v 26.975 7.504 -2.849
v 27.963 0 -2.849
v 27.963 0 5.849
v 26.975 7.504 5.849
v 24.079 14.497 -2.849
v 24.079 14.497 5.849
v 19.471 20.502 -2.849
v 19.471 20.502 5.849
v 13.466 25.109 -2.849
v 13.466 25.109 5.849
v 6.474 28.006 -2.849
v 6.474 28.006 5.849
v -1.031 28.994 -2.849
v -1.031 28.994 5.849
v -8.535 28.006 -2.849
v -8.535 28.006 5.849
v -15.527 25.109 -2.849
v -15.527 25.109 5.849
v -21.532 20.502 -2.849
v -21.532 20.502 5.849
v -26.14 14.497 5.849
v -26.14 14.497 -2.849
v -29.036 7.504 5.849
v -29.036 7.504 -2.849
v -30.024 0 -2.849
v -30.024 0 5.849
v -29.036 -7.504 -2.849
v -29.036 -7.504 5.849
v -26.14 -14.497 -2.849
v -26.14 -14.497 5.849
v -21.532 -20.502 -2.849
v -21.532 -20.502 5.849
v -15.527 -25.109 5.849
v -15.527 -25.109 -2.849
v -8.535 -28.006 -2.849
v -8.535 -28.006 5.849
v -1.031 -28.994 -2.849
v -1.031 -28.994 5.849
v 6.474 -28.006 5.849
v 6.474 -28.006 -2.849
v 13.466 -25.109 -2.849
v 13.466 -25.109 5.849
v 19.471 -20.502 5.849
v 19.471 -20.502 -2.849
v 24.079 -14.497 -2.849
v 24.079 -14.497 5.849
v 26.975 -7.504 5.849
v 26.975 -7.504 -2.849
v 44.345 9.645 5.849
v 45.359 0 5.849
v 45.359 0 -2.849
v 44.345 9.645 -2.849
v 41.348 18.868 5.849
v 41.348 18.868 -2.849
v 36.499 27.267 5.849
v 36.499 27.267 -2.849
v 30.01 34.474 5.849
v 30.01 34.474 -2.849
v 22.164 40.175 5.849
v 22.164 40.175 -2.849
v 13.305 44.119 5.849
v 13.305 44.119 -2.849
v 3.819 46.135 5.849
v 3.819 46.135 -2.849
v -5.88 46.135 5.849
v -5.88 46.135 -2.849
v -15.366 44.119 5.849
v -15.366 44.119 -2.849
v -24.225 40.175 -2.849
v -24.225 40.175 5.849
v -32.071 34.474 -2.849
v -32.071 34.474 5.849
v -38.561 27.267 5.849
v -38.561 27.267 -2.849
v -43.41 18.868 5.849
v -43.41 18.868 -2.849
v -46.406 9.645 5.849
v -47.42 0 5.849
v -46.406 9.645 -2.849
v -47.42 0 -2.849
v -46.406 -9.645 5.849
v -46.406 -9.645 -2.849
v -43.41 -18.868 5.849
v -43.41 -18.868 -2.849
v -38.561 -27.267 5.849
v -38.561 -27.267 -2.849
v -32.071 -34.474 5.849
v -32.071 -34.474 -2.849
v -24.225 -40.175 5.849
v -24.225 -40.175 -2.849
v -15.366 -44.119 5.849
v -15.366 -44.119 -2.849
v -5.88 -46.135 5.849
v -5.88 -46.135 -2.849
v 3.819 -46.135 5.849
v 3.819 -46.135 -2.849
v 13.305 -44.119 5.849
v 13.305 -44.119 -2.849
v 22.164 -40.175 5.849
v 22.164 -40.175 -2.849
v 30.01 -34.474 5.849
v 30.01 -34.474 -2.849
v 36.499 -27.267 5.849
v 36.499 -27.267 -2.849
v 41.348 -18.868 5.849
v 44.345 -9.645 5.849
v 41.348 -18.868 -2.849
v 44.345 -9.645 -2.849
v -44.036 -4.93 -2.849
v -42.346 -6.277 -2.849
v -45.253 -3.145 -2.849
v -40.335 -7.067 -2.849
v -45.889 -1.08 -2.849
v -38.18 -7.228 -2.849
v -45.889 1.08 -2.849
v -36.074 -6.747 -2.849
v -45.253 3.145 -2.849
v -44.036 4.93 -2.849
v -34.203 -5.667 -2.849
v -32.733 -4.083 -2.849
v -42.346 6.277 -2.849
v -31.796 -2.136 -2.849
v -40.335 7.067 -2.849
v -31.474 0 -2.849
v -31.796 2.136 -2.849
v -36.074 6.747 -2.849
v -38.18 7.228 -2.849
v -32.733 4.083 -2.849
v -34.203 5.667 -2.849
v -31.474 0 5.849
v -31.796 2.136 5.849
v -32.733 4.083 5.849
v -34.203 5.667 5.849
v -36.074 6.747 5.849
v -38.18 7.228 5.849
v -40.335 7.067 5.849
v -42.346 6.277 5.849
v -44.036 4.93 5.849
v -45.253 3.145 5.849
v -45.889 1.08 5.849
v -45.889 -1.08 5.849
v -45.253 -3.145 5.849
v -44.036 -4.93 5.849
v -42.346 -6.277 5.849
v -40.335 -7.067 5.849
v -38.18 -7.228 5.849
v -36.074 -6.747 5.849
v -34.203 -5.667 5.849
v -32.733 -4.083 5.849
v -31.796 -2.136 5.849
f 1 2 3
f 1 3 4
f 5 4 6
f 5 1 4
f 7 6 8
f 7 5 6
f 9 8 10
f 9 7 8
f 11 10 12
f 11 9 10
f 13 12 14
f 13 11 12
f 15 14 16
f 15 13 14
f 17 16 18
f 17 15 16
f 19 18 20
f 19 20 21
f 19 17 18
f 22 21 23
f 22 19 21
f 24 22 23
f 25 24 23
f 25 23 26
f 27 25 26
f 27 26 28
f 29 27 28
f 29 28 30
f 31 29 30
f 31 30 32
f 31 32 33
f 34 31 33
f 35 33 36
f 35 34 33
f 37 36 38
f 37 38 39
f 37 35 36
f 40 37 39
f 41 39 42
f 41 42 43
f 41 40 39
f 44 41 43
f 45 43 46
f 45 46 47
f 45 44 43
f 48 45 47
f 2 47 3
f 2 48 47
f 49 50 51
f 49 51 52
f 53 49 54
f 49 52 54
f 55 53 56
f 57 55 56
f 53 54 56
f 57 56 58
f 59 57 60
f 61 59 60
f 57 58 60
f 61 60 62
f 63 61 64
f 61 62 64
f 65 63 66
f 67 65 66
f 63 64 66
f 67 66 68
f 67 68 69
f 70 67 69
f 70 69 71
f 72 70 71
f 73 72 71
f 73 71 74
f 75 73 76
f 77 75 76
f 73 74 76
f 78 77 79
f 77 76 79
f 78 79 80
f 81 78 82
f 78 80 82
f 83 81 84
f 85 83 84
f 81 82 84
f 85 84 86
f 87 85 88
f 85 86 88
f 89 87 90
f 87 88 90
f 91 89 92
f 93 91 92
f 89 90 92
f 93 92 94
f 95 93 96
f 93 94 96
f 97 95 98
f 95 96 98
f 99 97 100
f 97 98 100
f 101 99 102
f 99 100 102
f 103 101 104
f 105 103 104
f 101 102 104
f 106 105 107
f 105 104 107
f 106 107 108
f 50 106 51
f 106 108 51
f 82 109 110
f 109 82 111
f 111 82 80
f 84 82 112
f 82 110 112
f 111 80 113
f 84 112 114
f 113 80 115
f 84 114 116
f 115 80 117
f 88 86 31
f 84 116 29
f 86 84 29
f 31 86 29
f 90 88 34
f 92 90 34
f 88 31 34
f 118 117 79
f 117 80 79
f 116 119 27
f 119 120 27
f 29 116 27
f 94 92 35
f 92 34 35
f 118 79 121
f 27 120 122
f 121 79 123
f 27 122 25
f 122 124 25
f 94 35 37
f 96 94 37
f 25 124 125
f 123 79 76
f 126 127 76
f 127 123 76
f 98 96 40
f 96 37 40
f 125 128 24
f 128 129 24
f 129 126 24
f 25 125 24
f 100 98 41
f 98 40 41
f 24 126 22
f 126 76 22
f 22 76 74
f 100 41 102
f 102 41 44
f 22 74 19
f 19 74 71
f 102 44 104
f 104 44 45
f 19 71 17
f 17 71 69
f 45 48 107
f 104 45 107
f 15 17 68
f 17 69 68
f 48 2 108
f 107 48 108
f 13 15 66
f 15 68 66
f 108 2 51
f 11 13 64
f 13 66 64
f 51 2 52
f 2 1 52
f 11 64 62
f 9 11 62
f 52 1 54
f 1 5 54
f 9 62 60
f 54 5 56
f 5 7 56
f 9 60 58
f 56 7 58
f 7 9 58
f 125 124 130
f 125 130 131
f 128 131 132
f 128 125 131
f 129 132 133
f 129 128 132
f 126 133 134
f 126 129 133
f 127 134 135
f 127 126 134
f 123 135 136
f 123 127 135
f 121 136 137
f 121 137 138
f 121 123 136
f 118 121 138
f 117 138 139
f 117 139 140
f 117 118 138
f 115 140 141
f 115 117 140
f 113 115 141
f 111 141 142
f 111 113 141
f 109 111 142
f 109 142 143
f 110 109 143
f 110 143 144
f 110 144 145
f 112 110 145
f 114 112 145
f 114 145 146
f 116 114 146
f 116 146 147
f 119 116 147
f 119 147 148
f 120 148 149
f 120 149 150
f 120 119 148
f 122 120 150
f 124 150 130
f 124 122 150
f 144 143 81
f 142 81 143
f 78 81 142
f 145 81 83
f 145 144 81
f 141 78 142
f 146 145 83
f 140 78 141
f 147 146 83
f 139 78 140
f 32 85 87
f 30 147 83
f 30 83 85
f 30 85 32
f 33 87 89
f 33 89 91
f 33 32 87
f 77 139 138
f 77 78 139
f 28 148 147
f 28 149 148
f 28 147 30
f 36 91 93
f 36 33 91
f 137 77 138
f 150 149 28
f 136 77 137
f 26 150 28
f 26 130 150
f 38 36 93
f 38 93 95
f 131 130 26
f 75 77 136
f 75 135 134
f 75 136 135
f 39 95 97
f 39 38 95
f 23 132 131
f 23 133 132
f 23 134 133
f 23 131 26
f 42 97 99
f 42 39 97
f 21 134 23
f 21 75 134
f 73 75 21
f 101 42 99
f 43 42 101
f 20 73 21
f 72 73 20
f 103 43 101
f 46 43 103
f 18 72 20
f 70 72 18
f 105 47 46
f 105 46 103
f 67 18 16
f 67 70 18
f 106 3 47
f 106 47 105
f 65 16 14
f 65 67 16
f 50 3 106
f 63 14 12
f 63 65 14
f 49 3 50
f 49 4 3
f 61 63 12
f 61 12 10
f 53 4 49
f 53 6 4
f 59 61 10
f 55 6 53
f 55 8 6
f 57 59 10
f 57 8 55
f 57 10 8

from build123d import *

# Parameters (mm, degrees)
SKETCH1_R           = 16
SKETCH1_R_2         = 10
SKETCH1_R_3         = 2.5
BOSS_EXTRUDE1_DEPTH = 3
SCALE1_SCALE        = 1.9329
SCALE2_SCALE        = 1.5


with BuildPart() as part:
    # Sketch1 → Boss-Extrude1 (new body)
    with BuildSketch(Plane.XY):
        Circle(SKETCH1_R)
        Circle(SKETCH1_R_2, mode=Mode.SUBTRACT)
        with Locations((-13, 0)):
            Circle(SKETCH1_R_3, mode=Mode.SUBTRACT)
    extrude(amount=BOSS_EXTRUDE1_DEPTH)


with BuildPart() as part_1:
    # Scale1: scaled about (0.542570952, 0, 1.5)
    add(part.part.scale(SCALE1_SCALE).moved(Location((-0.506164441, 0, -1.39935))))


with BuildPart() as part_2:
    # Scale2: scaled about (0.542570951, 0, 1.5)
    add(part_1.part.scale(SCALE2_SCALE).moved(Location((-0.271285475, 0, -0.75))))


solid = part_2.part
